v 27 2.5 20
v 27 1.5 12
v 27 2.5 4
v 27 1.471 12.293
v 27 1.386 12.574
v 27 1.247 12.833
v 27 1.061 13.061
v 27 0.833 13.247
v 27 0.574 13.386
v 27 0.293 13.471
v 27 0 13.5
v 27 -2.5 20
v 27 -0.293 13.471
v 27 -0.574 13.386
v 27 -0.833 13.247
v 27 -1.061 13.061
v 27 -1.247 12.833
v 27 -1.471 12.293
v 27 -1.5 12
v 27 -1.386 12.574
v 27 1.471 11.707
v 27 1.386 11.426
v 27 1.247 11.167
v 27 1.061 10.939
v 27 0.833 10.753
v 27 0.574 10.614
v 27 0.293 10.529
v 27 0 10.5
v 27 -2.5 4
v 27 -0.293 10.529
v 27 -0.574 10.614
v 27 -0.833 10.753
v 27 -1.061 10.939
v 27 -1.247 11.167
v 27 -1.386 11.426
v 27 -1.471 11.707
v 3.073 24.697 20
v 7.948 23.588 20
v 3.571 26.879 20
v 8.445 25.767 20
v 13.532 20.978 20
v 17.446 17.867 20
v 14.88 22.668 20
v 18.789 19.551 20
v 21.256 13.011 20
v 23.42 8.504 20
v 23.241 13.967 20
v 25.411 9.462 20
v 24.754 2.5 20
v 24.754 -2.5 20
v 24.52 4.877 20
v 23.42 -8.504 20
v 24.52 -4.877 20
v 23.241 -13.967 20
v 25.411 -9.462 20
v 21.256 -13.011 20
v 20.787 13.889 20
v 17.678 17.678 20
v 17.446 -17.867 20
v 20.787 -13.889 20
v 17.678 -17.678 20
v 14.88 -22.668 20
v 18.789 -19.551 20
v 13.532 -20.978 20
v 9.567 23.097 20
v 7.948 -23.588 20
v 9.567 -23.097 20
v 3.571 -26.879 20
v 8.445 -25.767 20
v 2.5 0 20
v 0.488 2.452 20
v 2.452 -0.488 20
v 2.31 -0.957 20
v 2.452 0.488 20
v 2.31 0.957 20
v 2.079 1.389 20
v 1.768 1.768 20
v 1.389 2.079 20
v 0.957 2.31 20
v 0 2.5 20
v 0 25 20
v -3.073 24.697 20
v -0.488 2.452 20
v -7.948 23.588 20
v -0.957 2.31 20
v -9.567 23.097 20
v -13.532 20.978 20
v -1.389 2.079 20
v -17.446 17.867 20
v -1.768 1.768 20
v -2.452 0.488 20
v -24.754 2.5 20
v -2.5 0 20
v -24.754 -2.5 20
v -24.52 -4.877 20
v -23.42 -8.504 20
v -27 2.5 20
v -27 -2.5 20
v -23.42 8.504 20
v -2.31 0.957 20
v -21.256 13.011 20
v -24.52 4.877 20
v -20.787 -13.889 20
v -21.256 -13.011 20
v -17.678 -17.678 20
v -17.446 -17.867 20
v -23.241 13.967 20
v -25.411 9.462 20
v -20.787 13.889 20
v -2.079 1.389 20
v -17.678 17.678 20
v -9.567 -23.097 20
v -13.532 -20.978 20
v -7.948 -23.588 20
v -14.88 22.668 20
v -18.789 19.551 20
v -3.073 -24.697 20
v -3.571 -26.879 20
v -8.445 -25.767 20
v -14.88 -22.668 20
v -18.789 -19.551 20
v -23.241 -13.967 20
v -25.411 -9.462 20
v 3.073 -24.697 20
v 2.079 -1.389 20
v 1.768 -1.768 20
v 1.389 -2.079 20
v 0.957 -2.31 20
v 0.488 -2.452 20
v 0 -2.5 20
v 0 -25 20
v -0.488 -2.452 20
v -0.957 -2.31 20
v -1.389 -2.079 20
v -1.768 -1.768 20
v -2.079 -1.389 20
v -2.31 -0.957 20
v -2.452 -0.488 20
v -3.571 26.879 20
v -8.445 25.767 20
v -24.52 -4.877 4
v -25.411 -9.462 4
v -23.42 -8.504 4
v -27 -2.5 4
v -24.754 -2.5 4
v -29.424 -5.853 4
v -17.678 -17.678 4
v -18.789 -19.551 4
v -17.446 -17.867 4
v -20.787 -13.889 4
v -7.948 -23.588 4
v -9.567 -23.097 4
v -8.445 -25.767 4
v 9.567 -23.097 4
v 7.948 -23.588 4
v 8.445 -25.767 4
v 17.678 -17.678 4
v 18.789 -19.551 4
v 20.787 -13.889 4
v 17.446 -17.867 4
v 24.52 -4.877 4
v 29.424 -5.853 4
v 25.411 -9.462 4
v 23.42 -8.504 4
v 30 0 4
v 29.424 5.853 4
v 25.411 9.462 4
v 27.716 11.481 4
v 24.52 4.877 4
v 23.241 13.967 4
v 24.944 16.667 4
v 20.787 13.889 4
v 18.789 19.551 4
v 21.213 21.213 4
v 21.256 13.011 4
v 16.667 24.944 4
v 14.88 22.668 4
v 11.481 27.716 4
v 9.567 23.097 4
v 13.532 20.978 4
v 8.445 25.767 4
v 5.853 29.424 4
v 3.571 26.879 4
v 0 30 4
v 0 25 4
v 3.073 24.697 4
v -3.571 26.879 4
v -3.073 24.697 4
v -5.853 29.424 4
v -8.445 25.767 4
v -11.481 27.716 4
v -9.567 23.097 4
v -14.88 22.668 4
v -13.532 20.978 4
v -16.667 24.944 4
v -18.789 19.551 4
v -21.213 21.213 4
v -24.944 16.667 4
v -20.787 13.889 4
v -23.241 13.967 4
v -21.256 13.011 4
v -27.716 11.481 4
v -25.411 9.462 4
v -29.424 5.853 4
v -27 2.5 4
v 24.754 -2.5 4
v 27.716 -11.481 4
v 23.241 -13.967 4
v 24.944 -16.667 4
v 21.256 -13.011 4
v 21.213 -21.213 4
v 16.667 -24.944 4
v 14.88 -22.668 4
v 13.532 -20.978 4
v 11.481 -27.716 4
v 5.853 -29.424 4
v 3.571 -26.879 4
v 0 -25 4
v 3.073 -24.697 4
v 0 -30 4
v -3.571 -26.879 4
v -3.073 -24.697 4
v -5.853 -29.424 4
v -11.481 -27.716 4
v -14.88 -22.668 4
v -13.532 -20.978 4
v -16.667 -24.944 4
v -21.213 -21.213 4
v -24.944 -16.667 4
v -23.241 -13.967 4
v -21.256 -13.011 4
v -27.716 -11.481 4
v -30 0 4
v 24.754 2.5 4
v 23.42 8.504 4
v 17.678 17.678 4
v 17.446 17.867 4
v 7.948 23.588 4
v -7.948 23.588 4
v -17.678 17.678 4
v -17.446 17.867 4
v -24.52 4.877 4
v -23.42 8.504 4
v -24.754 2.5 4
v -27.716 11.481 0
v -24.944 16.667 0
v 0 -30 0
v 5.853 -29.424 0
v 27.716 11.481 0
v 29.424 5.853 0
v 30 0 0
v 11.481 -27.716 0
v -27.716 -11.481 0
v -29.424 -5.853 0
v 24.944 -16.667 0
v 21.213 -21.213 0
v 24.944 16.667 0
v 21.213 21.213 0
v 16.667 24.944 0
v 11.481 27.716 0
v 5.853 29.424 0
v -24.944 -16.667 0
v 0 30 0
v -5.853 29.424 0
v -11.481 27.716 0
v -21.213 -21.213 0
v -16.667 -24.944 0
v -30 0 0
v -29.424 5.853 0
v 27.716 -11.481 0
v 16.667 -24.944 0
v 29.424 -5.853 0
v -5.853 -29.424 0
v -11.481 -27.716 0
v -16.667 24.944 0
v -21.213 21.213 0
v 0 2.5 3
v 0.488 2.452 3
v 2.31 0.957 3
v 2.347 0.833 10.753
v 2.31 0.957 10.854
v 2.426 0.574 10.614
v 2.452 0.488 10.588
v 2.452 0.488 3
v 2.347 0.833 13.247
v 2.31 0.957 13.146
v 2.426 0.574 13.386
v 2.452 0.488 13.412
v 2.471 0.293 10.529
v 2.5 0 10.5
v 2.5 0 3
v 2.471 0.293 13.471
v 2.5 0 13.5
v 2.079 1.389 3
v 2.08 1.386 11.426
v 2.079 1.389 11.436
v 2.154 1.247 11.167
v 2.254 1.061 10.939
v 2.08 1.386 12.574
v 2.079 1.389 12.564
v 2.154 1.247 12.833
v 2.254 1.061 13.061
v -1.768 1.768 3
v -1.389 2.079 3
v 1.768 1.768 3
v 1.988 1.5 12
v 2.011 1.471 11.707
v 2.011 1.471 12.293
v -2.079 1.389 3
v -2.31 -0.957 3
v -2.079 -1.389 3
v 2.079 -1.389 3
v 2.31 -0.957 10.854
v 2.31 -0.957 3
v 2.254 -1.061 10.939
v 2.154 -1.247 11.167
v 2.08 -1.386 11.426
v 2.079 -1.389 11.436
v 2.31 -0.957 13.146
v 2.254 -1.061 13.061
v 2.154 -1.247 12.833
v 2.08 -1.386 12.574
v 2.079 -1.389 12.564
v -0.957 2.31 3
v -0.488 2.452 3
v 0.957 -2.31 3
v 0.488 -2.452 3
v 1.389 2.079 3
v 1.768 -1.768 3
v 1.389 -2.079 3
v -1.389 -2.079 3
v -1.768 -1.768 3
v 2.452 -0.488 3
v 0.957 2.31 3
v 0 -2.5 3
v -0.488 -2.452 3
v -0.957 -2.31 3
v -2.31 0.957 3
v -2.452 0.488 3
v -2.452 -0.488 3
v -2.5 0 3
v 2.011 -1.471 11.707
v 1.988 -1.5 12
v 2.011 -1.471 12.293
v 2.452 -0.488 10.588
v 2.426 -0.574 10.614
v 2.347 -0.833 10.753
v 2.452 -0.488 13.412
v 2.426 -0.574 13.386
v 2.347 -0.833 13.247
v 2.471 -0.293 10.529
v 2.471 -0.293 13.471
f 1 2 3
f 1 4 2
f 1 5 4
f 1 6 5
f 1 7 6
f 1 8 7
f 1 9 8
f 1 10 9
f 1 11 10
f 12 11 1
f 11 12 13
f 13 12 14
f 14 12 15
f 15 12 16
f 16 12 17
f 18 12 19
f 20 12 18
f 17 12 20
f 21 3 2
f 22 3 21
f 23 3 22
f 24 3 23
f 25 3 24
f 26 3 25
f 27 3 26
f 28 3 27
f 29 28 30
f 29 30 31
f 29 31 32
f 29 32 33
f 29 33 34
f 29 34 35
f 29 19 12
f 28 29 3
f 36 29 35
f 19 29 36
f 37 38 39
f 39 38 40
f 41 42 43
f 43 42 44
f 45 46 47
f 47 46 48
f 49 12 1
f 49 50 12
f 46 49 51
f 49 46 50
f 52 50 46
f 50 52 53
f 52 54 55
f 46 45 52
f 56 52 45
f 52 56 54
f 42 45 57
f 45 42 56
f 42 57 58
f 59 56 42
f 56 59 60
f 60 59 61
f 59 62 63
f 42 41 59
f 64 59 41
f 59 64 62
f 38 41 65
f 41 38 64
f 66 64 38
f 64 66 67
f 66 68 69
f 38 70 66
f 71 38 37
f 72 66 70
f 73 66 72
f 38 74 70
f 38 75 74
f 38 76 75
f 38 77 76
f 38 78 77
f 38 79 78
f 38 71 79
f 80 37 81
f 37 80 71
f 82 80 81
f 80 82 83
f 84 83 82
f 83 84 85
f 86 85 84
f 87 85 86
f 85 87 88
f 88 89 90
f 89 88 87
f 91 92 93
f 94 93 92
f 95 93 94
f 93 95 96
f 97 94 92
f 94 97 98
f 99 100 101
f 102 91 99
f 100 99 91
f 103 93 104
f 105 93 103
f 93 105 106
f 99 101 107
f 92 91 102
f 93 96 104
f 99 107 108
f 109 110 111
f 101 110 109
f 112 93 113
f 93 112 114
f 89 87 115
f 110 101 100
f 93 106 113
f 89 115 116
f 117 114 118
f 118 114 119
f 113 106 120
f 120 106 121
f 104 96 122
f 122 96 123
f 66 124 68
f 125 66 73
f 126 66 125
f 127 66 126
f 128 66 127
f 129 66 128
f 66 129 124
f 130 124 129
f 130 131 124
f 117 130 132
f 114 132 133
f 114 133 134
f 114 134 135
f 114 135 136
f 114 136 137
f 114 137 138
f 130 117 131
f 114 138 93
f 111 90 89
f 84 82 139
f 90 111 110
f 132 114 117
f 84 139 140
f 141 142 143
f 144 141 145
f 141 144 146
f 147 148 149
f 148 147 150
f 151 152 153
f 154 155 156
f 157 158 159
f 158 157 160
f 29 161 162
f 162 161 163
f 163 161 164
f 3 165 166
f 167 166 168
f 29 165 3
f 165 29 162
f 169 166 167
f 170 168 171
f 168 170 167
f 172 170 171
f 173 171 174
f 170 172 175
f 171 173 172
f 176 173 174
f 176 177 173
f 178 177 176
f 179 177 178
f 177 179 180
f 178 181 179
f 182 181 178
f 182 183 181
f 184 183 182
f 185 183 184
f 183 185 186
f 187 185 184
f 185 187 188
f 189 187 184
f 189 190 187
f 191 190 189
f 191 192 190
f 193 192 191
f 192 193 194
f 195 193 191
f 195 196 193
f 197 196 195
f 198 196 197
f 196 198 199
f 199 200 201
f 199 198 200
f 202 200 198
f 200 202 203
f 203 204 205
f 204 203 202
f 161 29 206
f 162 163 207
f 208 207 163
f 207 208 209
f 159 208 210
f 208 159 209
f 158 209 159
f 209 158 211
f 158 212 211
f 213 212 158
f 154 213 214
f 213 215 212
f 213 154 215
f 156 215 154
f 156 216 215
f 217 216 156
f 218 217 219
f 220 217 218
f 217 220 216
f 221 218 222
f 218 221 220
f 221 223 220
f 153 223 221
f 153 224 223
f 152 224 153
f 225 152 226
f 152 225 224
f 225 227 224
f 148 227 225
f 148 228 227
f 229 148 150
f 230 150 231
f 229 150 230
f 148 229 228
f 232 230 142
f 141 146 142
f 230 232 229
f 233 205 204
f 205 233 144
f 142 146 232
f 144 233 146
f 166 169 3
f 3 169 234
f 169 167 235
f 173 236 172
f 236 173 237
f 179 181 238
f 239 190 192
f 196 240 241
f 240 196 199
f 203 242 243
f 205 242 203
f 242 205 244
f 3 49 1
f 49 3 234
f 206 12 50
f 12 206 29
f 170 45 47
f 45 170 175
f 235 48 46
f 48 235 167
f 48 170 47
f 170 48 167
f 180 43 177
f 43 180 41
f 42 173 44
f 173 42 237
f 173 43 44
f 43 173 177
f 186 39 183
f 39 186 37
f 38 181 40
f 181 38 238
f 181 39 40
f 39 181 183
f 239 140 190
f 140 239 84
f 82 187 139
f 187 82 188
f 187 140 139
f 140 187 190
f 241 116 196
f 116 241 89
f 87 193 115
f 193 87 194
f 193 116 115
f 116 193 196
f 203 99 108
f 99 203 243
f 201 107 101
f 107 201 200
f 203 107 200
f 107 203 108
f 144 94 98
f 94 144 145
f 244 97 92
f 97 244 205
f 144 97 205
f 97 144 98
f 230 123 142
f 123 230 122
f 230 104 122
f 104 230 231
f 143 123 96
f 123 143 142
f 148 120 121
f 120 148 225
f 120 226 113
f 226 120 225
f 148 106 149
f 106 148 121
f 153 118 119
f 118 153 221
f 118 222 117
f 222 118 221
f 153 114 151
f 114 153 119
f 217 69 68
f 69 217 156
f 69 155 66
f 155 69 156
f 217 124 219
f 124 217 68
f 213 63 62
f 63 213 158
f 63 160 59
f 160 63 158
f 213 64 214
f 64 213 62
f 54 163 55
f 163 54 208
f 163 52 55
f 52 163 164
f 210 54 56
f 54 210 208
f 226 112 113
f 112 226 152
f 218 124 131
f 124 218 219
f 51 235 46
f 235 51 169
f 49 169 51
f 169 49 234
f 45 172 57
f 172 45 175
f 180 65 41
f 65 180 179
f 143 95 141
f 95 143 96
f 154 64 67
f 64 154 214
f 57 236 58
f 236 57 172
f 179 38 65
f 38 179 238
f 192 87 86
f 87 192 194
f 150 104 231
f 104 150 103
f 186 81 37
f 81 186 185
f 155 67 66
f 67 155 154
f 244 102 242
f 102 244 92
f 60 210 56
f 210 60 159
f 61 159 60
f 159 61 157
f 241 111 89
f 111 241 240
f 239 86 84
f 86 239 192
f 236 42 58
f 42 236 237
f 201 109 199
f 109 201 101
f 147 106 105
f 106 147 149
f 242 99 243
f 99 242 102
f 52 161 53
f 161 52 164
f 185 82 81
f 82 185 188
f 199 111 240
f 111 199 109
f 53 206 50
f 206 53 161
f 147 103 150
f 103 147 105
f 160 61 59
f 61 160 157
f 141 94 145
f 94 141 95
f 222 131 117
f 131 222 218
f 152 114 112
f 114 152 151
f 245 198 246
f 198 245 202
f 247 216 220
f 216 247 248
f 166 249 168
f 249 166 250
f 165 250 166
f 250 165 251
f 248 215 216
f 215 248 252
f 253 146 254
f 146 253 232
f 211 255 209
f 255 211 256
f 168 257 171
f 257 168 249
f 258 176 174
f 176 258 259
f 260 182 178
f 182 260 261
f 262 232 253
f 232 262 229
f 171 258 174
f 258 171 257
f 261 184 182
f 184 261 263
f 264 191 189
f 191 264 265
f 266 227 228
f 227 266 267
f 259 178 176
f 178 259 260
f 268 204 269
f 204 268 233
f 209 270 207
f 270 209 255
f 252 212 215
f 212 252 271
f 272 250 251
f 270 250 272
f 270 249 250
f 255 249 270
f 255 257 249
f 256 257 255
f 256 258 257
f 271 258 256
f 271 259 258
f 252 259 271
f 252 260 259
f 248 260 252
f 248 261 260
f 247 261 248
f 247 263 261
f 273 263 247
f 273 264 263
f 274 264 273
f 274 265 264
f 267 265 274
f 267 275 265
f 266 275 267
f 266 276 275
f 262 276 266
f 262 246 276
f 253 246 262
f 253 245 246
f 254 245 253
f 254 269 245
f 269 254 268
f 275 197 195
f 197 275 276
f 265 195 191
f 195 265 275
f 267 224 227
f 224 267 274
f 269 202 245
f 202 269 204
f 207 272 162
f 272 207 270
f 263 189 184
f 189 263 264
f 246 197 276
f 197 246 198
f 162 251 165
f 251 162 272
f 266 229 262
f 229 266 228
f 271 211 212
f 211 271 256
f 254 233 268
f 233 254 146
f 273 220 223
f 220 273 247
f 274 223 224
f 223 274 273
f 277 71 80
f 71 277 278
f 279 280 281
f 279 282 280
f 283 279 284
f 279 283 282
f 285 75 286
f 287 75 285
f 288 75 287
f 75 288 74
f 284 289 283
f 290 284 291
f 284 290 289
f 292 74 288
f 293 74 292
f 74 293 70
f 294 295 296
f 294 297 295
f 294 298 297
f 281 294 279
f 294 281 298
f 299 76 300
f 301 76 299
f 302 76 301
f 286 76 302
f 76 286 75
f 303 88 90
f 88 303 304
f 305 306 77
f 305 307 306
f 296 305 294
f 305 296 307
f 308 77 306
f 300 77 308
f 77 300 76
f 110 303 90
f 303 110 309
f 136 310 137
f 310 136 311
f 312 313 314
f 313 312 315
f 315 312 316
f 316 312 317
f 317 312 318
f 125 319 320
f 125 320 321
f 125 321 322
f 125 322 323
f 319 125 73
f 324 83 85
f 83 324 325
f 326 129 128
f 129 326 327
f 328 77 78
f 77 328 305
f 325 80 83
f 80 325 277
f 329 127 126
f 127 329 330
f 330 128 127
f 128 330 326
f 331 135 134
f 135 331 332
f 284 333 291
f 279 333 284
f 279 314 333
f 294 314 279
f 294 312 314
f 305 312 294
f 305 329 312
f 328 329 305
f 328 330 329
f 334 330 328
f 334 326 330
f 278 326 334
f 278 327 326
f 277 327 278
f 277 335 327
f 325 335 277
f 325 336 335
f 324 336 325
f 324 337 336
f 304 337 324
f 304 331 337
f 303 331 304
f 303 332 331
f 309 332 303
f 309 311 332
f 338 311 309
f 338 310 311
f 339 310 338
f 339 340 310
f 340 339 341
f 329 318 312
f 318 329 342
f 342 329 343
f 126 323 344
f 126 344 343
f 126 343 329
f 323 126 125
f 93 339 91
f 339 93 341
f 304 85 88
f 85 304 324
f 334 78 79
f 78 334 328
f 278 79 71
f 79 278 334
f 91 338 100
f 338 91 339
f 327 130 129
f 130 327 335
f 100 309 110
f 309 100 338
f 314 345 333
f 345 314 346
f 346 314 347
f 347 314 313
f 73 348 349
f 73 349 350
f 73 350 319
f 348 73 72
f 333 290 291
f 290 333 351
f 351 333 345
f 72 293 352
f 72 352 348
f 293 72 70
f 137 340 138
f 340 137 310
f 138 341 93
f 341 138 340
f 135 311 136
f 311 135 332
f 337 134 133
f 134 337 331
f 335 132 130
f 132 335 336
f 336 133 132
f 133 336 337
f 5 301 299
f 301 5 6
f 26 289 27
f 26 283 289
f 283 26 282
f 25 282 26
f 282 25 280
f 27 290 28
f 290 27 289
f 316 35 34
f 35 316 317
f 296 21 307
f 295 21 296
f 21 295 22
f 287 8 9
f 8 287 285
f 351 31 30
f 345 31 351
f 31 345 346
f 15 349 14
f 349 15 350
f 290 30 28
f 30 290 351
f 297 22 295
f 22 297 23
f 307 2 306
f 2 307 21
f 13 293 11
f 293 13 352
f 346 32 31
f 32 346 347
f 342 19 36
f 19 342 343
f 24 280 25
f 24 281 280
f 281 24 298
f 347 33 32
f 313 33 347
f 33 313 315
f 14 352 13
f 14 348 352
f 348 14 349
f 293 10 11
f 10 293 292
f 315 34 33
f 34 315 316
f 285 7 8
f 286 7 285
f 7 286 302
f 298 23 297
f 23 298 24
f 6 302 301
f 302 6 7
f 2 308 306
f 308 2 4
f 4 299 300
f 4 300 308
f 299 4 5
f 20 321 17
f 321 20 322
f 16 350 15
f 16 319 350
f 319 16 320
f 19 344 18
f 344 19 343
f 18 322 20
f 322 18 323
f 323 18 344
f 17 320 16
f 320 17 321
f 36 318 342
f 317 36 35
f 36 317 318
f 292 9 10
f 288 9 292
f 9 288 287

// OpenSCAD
$fn = 32;

// ----------------------------------------------------------------------
// Control knob: skirt knob with grip ribs
// ----------------------------------------------------------------------

// --- parameters (mm) ---
skirt_d = 60;             // skirt diameter
skirt_t = 4;              // skirt thickness
rib_w = 5;                // grip rib width
rib_out = 3;              // grip rib radial protrusion
n_ribs = 14;              // number of grip ribs
knob_d = 50;              // knob body diameter
knob_h = 16;              // knob body height
bore_d = 5;               // shaft bore diameter
set_d = 3;                // set screw bore diameter

rib_step = 360 / n_ribs;  // rib angular step
total_h = skirt_t + knob_h;  // overall height

difference() {
  union() {
    translate([0, 0, skirt_t]) cylinder(h = knob_h, d = knob_d);
    cylinder(h = skirt_t, d = skirt_d);
    for (i = [0 : n_ribs - 1])
      rotate([0, 0, i * rib_step])
        translate([knob_d / 2 - 1, -rib_w / 2, skirt_t])
          cube([rib_out, rib_w, knob_h]);
  }
  translate([0, 0, skirt_t - 1]) cylinder(h = knob_h + 2, d = bore_d);
  translate([-1, 0, skirt_t + knob_h / 2]) rotate([0, 90, 0])
    cylinder(h = knob_d / 2 + bore_d / 2 + 2, d = set_d);
}
